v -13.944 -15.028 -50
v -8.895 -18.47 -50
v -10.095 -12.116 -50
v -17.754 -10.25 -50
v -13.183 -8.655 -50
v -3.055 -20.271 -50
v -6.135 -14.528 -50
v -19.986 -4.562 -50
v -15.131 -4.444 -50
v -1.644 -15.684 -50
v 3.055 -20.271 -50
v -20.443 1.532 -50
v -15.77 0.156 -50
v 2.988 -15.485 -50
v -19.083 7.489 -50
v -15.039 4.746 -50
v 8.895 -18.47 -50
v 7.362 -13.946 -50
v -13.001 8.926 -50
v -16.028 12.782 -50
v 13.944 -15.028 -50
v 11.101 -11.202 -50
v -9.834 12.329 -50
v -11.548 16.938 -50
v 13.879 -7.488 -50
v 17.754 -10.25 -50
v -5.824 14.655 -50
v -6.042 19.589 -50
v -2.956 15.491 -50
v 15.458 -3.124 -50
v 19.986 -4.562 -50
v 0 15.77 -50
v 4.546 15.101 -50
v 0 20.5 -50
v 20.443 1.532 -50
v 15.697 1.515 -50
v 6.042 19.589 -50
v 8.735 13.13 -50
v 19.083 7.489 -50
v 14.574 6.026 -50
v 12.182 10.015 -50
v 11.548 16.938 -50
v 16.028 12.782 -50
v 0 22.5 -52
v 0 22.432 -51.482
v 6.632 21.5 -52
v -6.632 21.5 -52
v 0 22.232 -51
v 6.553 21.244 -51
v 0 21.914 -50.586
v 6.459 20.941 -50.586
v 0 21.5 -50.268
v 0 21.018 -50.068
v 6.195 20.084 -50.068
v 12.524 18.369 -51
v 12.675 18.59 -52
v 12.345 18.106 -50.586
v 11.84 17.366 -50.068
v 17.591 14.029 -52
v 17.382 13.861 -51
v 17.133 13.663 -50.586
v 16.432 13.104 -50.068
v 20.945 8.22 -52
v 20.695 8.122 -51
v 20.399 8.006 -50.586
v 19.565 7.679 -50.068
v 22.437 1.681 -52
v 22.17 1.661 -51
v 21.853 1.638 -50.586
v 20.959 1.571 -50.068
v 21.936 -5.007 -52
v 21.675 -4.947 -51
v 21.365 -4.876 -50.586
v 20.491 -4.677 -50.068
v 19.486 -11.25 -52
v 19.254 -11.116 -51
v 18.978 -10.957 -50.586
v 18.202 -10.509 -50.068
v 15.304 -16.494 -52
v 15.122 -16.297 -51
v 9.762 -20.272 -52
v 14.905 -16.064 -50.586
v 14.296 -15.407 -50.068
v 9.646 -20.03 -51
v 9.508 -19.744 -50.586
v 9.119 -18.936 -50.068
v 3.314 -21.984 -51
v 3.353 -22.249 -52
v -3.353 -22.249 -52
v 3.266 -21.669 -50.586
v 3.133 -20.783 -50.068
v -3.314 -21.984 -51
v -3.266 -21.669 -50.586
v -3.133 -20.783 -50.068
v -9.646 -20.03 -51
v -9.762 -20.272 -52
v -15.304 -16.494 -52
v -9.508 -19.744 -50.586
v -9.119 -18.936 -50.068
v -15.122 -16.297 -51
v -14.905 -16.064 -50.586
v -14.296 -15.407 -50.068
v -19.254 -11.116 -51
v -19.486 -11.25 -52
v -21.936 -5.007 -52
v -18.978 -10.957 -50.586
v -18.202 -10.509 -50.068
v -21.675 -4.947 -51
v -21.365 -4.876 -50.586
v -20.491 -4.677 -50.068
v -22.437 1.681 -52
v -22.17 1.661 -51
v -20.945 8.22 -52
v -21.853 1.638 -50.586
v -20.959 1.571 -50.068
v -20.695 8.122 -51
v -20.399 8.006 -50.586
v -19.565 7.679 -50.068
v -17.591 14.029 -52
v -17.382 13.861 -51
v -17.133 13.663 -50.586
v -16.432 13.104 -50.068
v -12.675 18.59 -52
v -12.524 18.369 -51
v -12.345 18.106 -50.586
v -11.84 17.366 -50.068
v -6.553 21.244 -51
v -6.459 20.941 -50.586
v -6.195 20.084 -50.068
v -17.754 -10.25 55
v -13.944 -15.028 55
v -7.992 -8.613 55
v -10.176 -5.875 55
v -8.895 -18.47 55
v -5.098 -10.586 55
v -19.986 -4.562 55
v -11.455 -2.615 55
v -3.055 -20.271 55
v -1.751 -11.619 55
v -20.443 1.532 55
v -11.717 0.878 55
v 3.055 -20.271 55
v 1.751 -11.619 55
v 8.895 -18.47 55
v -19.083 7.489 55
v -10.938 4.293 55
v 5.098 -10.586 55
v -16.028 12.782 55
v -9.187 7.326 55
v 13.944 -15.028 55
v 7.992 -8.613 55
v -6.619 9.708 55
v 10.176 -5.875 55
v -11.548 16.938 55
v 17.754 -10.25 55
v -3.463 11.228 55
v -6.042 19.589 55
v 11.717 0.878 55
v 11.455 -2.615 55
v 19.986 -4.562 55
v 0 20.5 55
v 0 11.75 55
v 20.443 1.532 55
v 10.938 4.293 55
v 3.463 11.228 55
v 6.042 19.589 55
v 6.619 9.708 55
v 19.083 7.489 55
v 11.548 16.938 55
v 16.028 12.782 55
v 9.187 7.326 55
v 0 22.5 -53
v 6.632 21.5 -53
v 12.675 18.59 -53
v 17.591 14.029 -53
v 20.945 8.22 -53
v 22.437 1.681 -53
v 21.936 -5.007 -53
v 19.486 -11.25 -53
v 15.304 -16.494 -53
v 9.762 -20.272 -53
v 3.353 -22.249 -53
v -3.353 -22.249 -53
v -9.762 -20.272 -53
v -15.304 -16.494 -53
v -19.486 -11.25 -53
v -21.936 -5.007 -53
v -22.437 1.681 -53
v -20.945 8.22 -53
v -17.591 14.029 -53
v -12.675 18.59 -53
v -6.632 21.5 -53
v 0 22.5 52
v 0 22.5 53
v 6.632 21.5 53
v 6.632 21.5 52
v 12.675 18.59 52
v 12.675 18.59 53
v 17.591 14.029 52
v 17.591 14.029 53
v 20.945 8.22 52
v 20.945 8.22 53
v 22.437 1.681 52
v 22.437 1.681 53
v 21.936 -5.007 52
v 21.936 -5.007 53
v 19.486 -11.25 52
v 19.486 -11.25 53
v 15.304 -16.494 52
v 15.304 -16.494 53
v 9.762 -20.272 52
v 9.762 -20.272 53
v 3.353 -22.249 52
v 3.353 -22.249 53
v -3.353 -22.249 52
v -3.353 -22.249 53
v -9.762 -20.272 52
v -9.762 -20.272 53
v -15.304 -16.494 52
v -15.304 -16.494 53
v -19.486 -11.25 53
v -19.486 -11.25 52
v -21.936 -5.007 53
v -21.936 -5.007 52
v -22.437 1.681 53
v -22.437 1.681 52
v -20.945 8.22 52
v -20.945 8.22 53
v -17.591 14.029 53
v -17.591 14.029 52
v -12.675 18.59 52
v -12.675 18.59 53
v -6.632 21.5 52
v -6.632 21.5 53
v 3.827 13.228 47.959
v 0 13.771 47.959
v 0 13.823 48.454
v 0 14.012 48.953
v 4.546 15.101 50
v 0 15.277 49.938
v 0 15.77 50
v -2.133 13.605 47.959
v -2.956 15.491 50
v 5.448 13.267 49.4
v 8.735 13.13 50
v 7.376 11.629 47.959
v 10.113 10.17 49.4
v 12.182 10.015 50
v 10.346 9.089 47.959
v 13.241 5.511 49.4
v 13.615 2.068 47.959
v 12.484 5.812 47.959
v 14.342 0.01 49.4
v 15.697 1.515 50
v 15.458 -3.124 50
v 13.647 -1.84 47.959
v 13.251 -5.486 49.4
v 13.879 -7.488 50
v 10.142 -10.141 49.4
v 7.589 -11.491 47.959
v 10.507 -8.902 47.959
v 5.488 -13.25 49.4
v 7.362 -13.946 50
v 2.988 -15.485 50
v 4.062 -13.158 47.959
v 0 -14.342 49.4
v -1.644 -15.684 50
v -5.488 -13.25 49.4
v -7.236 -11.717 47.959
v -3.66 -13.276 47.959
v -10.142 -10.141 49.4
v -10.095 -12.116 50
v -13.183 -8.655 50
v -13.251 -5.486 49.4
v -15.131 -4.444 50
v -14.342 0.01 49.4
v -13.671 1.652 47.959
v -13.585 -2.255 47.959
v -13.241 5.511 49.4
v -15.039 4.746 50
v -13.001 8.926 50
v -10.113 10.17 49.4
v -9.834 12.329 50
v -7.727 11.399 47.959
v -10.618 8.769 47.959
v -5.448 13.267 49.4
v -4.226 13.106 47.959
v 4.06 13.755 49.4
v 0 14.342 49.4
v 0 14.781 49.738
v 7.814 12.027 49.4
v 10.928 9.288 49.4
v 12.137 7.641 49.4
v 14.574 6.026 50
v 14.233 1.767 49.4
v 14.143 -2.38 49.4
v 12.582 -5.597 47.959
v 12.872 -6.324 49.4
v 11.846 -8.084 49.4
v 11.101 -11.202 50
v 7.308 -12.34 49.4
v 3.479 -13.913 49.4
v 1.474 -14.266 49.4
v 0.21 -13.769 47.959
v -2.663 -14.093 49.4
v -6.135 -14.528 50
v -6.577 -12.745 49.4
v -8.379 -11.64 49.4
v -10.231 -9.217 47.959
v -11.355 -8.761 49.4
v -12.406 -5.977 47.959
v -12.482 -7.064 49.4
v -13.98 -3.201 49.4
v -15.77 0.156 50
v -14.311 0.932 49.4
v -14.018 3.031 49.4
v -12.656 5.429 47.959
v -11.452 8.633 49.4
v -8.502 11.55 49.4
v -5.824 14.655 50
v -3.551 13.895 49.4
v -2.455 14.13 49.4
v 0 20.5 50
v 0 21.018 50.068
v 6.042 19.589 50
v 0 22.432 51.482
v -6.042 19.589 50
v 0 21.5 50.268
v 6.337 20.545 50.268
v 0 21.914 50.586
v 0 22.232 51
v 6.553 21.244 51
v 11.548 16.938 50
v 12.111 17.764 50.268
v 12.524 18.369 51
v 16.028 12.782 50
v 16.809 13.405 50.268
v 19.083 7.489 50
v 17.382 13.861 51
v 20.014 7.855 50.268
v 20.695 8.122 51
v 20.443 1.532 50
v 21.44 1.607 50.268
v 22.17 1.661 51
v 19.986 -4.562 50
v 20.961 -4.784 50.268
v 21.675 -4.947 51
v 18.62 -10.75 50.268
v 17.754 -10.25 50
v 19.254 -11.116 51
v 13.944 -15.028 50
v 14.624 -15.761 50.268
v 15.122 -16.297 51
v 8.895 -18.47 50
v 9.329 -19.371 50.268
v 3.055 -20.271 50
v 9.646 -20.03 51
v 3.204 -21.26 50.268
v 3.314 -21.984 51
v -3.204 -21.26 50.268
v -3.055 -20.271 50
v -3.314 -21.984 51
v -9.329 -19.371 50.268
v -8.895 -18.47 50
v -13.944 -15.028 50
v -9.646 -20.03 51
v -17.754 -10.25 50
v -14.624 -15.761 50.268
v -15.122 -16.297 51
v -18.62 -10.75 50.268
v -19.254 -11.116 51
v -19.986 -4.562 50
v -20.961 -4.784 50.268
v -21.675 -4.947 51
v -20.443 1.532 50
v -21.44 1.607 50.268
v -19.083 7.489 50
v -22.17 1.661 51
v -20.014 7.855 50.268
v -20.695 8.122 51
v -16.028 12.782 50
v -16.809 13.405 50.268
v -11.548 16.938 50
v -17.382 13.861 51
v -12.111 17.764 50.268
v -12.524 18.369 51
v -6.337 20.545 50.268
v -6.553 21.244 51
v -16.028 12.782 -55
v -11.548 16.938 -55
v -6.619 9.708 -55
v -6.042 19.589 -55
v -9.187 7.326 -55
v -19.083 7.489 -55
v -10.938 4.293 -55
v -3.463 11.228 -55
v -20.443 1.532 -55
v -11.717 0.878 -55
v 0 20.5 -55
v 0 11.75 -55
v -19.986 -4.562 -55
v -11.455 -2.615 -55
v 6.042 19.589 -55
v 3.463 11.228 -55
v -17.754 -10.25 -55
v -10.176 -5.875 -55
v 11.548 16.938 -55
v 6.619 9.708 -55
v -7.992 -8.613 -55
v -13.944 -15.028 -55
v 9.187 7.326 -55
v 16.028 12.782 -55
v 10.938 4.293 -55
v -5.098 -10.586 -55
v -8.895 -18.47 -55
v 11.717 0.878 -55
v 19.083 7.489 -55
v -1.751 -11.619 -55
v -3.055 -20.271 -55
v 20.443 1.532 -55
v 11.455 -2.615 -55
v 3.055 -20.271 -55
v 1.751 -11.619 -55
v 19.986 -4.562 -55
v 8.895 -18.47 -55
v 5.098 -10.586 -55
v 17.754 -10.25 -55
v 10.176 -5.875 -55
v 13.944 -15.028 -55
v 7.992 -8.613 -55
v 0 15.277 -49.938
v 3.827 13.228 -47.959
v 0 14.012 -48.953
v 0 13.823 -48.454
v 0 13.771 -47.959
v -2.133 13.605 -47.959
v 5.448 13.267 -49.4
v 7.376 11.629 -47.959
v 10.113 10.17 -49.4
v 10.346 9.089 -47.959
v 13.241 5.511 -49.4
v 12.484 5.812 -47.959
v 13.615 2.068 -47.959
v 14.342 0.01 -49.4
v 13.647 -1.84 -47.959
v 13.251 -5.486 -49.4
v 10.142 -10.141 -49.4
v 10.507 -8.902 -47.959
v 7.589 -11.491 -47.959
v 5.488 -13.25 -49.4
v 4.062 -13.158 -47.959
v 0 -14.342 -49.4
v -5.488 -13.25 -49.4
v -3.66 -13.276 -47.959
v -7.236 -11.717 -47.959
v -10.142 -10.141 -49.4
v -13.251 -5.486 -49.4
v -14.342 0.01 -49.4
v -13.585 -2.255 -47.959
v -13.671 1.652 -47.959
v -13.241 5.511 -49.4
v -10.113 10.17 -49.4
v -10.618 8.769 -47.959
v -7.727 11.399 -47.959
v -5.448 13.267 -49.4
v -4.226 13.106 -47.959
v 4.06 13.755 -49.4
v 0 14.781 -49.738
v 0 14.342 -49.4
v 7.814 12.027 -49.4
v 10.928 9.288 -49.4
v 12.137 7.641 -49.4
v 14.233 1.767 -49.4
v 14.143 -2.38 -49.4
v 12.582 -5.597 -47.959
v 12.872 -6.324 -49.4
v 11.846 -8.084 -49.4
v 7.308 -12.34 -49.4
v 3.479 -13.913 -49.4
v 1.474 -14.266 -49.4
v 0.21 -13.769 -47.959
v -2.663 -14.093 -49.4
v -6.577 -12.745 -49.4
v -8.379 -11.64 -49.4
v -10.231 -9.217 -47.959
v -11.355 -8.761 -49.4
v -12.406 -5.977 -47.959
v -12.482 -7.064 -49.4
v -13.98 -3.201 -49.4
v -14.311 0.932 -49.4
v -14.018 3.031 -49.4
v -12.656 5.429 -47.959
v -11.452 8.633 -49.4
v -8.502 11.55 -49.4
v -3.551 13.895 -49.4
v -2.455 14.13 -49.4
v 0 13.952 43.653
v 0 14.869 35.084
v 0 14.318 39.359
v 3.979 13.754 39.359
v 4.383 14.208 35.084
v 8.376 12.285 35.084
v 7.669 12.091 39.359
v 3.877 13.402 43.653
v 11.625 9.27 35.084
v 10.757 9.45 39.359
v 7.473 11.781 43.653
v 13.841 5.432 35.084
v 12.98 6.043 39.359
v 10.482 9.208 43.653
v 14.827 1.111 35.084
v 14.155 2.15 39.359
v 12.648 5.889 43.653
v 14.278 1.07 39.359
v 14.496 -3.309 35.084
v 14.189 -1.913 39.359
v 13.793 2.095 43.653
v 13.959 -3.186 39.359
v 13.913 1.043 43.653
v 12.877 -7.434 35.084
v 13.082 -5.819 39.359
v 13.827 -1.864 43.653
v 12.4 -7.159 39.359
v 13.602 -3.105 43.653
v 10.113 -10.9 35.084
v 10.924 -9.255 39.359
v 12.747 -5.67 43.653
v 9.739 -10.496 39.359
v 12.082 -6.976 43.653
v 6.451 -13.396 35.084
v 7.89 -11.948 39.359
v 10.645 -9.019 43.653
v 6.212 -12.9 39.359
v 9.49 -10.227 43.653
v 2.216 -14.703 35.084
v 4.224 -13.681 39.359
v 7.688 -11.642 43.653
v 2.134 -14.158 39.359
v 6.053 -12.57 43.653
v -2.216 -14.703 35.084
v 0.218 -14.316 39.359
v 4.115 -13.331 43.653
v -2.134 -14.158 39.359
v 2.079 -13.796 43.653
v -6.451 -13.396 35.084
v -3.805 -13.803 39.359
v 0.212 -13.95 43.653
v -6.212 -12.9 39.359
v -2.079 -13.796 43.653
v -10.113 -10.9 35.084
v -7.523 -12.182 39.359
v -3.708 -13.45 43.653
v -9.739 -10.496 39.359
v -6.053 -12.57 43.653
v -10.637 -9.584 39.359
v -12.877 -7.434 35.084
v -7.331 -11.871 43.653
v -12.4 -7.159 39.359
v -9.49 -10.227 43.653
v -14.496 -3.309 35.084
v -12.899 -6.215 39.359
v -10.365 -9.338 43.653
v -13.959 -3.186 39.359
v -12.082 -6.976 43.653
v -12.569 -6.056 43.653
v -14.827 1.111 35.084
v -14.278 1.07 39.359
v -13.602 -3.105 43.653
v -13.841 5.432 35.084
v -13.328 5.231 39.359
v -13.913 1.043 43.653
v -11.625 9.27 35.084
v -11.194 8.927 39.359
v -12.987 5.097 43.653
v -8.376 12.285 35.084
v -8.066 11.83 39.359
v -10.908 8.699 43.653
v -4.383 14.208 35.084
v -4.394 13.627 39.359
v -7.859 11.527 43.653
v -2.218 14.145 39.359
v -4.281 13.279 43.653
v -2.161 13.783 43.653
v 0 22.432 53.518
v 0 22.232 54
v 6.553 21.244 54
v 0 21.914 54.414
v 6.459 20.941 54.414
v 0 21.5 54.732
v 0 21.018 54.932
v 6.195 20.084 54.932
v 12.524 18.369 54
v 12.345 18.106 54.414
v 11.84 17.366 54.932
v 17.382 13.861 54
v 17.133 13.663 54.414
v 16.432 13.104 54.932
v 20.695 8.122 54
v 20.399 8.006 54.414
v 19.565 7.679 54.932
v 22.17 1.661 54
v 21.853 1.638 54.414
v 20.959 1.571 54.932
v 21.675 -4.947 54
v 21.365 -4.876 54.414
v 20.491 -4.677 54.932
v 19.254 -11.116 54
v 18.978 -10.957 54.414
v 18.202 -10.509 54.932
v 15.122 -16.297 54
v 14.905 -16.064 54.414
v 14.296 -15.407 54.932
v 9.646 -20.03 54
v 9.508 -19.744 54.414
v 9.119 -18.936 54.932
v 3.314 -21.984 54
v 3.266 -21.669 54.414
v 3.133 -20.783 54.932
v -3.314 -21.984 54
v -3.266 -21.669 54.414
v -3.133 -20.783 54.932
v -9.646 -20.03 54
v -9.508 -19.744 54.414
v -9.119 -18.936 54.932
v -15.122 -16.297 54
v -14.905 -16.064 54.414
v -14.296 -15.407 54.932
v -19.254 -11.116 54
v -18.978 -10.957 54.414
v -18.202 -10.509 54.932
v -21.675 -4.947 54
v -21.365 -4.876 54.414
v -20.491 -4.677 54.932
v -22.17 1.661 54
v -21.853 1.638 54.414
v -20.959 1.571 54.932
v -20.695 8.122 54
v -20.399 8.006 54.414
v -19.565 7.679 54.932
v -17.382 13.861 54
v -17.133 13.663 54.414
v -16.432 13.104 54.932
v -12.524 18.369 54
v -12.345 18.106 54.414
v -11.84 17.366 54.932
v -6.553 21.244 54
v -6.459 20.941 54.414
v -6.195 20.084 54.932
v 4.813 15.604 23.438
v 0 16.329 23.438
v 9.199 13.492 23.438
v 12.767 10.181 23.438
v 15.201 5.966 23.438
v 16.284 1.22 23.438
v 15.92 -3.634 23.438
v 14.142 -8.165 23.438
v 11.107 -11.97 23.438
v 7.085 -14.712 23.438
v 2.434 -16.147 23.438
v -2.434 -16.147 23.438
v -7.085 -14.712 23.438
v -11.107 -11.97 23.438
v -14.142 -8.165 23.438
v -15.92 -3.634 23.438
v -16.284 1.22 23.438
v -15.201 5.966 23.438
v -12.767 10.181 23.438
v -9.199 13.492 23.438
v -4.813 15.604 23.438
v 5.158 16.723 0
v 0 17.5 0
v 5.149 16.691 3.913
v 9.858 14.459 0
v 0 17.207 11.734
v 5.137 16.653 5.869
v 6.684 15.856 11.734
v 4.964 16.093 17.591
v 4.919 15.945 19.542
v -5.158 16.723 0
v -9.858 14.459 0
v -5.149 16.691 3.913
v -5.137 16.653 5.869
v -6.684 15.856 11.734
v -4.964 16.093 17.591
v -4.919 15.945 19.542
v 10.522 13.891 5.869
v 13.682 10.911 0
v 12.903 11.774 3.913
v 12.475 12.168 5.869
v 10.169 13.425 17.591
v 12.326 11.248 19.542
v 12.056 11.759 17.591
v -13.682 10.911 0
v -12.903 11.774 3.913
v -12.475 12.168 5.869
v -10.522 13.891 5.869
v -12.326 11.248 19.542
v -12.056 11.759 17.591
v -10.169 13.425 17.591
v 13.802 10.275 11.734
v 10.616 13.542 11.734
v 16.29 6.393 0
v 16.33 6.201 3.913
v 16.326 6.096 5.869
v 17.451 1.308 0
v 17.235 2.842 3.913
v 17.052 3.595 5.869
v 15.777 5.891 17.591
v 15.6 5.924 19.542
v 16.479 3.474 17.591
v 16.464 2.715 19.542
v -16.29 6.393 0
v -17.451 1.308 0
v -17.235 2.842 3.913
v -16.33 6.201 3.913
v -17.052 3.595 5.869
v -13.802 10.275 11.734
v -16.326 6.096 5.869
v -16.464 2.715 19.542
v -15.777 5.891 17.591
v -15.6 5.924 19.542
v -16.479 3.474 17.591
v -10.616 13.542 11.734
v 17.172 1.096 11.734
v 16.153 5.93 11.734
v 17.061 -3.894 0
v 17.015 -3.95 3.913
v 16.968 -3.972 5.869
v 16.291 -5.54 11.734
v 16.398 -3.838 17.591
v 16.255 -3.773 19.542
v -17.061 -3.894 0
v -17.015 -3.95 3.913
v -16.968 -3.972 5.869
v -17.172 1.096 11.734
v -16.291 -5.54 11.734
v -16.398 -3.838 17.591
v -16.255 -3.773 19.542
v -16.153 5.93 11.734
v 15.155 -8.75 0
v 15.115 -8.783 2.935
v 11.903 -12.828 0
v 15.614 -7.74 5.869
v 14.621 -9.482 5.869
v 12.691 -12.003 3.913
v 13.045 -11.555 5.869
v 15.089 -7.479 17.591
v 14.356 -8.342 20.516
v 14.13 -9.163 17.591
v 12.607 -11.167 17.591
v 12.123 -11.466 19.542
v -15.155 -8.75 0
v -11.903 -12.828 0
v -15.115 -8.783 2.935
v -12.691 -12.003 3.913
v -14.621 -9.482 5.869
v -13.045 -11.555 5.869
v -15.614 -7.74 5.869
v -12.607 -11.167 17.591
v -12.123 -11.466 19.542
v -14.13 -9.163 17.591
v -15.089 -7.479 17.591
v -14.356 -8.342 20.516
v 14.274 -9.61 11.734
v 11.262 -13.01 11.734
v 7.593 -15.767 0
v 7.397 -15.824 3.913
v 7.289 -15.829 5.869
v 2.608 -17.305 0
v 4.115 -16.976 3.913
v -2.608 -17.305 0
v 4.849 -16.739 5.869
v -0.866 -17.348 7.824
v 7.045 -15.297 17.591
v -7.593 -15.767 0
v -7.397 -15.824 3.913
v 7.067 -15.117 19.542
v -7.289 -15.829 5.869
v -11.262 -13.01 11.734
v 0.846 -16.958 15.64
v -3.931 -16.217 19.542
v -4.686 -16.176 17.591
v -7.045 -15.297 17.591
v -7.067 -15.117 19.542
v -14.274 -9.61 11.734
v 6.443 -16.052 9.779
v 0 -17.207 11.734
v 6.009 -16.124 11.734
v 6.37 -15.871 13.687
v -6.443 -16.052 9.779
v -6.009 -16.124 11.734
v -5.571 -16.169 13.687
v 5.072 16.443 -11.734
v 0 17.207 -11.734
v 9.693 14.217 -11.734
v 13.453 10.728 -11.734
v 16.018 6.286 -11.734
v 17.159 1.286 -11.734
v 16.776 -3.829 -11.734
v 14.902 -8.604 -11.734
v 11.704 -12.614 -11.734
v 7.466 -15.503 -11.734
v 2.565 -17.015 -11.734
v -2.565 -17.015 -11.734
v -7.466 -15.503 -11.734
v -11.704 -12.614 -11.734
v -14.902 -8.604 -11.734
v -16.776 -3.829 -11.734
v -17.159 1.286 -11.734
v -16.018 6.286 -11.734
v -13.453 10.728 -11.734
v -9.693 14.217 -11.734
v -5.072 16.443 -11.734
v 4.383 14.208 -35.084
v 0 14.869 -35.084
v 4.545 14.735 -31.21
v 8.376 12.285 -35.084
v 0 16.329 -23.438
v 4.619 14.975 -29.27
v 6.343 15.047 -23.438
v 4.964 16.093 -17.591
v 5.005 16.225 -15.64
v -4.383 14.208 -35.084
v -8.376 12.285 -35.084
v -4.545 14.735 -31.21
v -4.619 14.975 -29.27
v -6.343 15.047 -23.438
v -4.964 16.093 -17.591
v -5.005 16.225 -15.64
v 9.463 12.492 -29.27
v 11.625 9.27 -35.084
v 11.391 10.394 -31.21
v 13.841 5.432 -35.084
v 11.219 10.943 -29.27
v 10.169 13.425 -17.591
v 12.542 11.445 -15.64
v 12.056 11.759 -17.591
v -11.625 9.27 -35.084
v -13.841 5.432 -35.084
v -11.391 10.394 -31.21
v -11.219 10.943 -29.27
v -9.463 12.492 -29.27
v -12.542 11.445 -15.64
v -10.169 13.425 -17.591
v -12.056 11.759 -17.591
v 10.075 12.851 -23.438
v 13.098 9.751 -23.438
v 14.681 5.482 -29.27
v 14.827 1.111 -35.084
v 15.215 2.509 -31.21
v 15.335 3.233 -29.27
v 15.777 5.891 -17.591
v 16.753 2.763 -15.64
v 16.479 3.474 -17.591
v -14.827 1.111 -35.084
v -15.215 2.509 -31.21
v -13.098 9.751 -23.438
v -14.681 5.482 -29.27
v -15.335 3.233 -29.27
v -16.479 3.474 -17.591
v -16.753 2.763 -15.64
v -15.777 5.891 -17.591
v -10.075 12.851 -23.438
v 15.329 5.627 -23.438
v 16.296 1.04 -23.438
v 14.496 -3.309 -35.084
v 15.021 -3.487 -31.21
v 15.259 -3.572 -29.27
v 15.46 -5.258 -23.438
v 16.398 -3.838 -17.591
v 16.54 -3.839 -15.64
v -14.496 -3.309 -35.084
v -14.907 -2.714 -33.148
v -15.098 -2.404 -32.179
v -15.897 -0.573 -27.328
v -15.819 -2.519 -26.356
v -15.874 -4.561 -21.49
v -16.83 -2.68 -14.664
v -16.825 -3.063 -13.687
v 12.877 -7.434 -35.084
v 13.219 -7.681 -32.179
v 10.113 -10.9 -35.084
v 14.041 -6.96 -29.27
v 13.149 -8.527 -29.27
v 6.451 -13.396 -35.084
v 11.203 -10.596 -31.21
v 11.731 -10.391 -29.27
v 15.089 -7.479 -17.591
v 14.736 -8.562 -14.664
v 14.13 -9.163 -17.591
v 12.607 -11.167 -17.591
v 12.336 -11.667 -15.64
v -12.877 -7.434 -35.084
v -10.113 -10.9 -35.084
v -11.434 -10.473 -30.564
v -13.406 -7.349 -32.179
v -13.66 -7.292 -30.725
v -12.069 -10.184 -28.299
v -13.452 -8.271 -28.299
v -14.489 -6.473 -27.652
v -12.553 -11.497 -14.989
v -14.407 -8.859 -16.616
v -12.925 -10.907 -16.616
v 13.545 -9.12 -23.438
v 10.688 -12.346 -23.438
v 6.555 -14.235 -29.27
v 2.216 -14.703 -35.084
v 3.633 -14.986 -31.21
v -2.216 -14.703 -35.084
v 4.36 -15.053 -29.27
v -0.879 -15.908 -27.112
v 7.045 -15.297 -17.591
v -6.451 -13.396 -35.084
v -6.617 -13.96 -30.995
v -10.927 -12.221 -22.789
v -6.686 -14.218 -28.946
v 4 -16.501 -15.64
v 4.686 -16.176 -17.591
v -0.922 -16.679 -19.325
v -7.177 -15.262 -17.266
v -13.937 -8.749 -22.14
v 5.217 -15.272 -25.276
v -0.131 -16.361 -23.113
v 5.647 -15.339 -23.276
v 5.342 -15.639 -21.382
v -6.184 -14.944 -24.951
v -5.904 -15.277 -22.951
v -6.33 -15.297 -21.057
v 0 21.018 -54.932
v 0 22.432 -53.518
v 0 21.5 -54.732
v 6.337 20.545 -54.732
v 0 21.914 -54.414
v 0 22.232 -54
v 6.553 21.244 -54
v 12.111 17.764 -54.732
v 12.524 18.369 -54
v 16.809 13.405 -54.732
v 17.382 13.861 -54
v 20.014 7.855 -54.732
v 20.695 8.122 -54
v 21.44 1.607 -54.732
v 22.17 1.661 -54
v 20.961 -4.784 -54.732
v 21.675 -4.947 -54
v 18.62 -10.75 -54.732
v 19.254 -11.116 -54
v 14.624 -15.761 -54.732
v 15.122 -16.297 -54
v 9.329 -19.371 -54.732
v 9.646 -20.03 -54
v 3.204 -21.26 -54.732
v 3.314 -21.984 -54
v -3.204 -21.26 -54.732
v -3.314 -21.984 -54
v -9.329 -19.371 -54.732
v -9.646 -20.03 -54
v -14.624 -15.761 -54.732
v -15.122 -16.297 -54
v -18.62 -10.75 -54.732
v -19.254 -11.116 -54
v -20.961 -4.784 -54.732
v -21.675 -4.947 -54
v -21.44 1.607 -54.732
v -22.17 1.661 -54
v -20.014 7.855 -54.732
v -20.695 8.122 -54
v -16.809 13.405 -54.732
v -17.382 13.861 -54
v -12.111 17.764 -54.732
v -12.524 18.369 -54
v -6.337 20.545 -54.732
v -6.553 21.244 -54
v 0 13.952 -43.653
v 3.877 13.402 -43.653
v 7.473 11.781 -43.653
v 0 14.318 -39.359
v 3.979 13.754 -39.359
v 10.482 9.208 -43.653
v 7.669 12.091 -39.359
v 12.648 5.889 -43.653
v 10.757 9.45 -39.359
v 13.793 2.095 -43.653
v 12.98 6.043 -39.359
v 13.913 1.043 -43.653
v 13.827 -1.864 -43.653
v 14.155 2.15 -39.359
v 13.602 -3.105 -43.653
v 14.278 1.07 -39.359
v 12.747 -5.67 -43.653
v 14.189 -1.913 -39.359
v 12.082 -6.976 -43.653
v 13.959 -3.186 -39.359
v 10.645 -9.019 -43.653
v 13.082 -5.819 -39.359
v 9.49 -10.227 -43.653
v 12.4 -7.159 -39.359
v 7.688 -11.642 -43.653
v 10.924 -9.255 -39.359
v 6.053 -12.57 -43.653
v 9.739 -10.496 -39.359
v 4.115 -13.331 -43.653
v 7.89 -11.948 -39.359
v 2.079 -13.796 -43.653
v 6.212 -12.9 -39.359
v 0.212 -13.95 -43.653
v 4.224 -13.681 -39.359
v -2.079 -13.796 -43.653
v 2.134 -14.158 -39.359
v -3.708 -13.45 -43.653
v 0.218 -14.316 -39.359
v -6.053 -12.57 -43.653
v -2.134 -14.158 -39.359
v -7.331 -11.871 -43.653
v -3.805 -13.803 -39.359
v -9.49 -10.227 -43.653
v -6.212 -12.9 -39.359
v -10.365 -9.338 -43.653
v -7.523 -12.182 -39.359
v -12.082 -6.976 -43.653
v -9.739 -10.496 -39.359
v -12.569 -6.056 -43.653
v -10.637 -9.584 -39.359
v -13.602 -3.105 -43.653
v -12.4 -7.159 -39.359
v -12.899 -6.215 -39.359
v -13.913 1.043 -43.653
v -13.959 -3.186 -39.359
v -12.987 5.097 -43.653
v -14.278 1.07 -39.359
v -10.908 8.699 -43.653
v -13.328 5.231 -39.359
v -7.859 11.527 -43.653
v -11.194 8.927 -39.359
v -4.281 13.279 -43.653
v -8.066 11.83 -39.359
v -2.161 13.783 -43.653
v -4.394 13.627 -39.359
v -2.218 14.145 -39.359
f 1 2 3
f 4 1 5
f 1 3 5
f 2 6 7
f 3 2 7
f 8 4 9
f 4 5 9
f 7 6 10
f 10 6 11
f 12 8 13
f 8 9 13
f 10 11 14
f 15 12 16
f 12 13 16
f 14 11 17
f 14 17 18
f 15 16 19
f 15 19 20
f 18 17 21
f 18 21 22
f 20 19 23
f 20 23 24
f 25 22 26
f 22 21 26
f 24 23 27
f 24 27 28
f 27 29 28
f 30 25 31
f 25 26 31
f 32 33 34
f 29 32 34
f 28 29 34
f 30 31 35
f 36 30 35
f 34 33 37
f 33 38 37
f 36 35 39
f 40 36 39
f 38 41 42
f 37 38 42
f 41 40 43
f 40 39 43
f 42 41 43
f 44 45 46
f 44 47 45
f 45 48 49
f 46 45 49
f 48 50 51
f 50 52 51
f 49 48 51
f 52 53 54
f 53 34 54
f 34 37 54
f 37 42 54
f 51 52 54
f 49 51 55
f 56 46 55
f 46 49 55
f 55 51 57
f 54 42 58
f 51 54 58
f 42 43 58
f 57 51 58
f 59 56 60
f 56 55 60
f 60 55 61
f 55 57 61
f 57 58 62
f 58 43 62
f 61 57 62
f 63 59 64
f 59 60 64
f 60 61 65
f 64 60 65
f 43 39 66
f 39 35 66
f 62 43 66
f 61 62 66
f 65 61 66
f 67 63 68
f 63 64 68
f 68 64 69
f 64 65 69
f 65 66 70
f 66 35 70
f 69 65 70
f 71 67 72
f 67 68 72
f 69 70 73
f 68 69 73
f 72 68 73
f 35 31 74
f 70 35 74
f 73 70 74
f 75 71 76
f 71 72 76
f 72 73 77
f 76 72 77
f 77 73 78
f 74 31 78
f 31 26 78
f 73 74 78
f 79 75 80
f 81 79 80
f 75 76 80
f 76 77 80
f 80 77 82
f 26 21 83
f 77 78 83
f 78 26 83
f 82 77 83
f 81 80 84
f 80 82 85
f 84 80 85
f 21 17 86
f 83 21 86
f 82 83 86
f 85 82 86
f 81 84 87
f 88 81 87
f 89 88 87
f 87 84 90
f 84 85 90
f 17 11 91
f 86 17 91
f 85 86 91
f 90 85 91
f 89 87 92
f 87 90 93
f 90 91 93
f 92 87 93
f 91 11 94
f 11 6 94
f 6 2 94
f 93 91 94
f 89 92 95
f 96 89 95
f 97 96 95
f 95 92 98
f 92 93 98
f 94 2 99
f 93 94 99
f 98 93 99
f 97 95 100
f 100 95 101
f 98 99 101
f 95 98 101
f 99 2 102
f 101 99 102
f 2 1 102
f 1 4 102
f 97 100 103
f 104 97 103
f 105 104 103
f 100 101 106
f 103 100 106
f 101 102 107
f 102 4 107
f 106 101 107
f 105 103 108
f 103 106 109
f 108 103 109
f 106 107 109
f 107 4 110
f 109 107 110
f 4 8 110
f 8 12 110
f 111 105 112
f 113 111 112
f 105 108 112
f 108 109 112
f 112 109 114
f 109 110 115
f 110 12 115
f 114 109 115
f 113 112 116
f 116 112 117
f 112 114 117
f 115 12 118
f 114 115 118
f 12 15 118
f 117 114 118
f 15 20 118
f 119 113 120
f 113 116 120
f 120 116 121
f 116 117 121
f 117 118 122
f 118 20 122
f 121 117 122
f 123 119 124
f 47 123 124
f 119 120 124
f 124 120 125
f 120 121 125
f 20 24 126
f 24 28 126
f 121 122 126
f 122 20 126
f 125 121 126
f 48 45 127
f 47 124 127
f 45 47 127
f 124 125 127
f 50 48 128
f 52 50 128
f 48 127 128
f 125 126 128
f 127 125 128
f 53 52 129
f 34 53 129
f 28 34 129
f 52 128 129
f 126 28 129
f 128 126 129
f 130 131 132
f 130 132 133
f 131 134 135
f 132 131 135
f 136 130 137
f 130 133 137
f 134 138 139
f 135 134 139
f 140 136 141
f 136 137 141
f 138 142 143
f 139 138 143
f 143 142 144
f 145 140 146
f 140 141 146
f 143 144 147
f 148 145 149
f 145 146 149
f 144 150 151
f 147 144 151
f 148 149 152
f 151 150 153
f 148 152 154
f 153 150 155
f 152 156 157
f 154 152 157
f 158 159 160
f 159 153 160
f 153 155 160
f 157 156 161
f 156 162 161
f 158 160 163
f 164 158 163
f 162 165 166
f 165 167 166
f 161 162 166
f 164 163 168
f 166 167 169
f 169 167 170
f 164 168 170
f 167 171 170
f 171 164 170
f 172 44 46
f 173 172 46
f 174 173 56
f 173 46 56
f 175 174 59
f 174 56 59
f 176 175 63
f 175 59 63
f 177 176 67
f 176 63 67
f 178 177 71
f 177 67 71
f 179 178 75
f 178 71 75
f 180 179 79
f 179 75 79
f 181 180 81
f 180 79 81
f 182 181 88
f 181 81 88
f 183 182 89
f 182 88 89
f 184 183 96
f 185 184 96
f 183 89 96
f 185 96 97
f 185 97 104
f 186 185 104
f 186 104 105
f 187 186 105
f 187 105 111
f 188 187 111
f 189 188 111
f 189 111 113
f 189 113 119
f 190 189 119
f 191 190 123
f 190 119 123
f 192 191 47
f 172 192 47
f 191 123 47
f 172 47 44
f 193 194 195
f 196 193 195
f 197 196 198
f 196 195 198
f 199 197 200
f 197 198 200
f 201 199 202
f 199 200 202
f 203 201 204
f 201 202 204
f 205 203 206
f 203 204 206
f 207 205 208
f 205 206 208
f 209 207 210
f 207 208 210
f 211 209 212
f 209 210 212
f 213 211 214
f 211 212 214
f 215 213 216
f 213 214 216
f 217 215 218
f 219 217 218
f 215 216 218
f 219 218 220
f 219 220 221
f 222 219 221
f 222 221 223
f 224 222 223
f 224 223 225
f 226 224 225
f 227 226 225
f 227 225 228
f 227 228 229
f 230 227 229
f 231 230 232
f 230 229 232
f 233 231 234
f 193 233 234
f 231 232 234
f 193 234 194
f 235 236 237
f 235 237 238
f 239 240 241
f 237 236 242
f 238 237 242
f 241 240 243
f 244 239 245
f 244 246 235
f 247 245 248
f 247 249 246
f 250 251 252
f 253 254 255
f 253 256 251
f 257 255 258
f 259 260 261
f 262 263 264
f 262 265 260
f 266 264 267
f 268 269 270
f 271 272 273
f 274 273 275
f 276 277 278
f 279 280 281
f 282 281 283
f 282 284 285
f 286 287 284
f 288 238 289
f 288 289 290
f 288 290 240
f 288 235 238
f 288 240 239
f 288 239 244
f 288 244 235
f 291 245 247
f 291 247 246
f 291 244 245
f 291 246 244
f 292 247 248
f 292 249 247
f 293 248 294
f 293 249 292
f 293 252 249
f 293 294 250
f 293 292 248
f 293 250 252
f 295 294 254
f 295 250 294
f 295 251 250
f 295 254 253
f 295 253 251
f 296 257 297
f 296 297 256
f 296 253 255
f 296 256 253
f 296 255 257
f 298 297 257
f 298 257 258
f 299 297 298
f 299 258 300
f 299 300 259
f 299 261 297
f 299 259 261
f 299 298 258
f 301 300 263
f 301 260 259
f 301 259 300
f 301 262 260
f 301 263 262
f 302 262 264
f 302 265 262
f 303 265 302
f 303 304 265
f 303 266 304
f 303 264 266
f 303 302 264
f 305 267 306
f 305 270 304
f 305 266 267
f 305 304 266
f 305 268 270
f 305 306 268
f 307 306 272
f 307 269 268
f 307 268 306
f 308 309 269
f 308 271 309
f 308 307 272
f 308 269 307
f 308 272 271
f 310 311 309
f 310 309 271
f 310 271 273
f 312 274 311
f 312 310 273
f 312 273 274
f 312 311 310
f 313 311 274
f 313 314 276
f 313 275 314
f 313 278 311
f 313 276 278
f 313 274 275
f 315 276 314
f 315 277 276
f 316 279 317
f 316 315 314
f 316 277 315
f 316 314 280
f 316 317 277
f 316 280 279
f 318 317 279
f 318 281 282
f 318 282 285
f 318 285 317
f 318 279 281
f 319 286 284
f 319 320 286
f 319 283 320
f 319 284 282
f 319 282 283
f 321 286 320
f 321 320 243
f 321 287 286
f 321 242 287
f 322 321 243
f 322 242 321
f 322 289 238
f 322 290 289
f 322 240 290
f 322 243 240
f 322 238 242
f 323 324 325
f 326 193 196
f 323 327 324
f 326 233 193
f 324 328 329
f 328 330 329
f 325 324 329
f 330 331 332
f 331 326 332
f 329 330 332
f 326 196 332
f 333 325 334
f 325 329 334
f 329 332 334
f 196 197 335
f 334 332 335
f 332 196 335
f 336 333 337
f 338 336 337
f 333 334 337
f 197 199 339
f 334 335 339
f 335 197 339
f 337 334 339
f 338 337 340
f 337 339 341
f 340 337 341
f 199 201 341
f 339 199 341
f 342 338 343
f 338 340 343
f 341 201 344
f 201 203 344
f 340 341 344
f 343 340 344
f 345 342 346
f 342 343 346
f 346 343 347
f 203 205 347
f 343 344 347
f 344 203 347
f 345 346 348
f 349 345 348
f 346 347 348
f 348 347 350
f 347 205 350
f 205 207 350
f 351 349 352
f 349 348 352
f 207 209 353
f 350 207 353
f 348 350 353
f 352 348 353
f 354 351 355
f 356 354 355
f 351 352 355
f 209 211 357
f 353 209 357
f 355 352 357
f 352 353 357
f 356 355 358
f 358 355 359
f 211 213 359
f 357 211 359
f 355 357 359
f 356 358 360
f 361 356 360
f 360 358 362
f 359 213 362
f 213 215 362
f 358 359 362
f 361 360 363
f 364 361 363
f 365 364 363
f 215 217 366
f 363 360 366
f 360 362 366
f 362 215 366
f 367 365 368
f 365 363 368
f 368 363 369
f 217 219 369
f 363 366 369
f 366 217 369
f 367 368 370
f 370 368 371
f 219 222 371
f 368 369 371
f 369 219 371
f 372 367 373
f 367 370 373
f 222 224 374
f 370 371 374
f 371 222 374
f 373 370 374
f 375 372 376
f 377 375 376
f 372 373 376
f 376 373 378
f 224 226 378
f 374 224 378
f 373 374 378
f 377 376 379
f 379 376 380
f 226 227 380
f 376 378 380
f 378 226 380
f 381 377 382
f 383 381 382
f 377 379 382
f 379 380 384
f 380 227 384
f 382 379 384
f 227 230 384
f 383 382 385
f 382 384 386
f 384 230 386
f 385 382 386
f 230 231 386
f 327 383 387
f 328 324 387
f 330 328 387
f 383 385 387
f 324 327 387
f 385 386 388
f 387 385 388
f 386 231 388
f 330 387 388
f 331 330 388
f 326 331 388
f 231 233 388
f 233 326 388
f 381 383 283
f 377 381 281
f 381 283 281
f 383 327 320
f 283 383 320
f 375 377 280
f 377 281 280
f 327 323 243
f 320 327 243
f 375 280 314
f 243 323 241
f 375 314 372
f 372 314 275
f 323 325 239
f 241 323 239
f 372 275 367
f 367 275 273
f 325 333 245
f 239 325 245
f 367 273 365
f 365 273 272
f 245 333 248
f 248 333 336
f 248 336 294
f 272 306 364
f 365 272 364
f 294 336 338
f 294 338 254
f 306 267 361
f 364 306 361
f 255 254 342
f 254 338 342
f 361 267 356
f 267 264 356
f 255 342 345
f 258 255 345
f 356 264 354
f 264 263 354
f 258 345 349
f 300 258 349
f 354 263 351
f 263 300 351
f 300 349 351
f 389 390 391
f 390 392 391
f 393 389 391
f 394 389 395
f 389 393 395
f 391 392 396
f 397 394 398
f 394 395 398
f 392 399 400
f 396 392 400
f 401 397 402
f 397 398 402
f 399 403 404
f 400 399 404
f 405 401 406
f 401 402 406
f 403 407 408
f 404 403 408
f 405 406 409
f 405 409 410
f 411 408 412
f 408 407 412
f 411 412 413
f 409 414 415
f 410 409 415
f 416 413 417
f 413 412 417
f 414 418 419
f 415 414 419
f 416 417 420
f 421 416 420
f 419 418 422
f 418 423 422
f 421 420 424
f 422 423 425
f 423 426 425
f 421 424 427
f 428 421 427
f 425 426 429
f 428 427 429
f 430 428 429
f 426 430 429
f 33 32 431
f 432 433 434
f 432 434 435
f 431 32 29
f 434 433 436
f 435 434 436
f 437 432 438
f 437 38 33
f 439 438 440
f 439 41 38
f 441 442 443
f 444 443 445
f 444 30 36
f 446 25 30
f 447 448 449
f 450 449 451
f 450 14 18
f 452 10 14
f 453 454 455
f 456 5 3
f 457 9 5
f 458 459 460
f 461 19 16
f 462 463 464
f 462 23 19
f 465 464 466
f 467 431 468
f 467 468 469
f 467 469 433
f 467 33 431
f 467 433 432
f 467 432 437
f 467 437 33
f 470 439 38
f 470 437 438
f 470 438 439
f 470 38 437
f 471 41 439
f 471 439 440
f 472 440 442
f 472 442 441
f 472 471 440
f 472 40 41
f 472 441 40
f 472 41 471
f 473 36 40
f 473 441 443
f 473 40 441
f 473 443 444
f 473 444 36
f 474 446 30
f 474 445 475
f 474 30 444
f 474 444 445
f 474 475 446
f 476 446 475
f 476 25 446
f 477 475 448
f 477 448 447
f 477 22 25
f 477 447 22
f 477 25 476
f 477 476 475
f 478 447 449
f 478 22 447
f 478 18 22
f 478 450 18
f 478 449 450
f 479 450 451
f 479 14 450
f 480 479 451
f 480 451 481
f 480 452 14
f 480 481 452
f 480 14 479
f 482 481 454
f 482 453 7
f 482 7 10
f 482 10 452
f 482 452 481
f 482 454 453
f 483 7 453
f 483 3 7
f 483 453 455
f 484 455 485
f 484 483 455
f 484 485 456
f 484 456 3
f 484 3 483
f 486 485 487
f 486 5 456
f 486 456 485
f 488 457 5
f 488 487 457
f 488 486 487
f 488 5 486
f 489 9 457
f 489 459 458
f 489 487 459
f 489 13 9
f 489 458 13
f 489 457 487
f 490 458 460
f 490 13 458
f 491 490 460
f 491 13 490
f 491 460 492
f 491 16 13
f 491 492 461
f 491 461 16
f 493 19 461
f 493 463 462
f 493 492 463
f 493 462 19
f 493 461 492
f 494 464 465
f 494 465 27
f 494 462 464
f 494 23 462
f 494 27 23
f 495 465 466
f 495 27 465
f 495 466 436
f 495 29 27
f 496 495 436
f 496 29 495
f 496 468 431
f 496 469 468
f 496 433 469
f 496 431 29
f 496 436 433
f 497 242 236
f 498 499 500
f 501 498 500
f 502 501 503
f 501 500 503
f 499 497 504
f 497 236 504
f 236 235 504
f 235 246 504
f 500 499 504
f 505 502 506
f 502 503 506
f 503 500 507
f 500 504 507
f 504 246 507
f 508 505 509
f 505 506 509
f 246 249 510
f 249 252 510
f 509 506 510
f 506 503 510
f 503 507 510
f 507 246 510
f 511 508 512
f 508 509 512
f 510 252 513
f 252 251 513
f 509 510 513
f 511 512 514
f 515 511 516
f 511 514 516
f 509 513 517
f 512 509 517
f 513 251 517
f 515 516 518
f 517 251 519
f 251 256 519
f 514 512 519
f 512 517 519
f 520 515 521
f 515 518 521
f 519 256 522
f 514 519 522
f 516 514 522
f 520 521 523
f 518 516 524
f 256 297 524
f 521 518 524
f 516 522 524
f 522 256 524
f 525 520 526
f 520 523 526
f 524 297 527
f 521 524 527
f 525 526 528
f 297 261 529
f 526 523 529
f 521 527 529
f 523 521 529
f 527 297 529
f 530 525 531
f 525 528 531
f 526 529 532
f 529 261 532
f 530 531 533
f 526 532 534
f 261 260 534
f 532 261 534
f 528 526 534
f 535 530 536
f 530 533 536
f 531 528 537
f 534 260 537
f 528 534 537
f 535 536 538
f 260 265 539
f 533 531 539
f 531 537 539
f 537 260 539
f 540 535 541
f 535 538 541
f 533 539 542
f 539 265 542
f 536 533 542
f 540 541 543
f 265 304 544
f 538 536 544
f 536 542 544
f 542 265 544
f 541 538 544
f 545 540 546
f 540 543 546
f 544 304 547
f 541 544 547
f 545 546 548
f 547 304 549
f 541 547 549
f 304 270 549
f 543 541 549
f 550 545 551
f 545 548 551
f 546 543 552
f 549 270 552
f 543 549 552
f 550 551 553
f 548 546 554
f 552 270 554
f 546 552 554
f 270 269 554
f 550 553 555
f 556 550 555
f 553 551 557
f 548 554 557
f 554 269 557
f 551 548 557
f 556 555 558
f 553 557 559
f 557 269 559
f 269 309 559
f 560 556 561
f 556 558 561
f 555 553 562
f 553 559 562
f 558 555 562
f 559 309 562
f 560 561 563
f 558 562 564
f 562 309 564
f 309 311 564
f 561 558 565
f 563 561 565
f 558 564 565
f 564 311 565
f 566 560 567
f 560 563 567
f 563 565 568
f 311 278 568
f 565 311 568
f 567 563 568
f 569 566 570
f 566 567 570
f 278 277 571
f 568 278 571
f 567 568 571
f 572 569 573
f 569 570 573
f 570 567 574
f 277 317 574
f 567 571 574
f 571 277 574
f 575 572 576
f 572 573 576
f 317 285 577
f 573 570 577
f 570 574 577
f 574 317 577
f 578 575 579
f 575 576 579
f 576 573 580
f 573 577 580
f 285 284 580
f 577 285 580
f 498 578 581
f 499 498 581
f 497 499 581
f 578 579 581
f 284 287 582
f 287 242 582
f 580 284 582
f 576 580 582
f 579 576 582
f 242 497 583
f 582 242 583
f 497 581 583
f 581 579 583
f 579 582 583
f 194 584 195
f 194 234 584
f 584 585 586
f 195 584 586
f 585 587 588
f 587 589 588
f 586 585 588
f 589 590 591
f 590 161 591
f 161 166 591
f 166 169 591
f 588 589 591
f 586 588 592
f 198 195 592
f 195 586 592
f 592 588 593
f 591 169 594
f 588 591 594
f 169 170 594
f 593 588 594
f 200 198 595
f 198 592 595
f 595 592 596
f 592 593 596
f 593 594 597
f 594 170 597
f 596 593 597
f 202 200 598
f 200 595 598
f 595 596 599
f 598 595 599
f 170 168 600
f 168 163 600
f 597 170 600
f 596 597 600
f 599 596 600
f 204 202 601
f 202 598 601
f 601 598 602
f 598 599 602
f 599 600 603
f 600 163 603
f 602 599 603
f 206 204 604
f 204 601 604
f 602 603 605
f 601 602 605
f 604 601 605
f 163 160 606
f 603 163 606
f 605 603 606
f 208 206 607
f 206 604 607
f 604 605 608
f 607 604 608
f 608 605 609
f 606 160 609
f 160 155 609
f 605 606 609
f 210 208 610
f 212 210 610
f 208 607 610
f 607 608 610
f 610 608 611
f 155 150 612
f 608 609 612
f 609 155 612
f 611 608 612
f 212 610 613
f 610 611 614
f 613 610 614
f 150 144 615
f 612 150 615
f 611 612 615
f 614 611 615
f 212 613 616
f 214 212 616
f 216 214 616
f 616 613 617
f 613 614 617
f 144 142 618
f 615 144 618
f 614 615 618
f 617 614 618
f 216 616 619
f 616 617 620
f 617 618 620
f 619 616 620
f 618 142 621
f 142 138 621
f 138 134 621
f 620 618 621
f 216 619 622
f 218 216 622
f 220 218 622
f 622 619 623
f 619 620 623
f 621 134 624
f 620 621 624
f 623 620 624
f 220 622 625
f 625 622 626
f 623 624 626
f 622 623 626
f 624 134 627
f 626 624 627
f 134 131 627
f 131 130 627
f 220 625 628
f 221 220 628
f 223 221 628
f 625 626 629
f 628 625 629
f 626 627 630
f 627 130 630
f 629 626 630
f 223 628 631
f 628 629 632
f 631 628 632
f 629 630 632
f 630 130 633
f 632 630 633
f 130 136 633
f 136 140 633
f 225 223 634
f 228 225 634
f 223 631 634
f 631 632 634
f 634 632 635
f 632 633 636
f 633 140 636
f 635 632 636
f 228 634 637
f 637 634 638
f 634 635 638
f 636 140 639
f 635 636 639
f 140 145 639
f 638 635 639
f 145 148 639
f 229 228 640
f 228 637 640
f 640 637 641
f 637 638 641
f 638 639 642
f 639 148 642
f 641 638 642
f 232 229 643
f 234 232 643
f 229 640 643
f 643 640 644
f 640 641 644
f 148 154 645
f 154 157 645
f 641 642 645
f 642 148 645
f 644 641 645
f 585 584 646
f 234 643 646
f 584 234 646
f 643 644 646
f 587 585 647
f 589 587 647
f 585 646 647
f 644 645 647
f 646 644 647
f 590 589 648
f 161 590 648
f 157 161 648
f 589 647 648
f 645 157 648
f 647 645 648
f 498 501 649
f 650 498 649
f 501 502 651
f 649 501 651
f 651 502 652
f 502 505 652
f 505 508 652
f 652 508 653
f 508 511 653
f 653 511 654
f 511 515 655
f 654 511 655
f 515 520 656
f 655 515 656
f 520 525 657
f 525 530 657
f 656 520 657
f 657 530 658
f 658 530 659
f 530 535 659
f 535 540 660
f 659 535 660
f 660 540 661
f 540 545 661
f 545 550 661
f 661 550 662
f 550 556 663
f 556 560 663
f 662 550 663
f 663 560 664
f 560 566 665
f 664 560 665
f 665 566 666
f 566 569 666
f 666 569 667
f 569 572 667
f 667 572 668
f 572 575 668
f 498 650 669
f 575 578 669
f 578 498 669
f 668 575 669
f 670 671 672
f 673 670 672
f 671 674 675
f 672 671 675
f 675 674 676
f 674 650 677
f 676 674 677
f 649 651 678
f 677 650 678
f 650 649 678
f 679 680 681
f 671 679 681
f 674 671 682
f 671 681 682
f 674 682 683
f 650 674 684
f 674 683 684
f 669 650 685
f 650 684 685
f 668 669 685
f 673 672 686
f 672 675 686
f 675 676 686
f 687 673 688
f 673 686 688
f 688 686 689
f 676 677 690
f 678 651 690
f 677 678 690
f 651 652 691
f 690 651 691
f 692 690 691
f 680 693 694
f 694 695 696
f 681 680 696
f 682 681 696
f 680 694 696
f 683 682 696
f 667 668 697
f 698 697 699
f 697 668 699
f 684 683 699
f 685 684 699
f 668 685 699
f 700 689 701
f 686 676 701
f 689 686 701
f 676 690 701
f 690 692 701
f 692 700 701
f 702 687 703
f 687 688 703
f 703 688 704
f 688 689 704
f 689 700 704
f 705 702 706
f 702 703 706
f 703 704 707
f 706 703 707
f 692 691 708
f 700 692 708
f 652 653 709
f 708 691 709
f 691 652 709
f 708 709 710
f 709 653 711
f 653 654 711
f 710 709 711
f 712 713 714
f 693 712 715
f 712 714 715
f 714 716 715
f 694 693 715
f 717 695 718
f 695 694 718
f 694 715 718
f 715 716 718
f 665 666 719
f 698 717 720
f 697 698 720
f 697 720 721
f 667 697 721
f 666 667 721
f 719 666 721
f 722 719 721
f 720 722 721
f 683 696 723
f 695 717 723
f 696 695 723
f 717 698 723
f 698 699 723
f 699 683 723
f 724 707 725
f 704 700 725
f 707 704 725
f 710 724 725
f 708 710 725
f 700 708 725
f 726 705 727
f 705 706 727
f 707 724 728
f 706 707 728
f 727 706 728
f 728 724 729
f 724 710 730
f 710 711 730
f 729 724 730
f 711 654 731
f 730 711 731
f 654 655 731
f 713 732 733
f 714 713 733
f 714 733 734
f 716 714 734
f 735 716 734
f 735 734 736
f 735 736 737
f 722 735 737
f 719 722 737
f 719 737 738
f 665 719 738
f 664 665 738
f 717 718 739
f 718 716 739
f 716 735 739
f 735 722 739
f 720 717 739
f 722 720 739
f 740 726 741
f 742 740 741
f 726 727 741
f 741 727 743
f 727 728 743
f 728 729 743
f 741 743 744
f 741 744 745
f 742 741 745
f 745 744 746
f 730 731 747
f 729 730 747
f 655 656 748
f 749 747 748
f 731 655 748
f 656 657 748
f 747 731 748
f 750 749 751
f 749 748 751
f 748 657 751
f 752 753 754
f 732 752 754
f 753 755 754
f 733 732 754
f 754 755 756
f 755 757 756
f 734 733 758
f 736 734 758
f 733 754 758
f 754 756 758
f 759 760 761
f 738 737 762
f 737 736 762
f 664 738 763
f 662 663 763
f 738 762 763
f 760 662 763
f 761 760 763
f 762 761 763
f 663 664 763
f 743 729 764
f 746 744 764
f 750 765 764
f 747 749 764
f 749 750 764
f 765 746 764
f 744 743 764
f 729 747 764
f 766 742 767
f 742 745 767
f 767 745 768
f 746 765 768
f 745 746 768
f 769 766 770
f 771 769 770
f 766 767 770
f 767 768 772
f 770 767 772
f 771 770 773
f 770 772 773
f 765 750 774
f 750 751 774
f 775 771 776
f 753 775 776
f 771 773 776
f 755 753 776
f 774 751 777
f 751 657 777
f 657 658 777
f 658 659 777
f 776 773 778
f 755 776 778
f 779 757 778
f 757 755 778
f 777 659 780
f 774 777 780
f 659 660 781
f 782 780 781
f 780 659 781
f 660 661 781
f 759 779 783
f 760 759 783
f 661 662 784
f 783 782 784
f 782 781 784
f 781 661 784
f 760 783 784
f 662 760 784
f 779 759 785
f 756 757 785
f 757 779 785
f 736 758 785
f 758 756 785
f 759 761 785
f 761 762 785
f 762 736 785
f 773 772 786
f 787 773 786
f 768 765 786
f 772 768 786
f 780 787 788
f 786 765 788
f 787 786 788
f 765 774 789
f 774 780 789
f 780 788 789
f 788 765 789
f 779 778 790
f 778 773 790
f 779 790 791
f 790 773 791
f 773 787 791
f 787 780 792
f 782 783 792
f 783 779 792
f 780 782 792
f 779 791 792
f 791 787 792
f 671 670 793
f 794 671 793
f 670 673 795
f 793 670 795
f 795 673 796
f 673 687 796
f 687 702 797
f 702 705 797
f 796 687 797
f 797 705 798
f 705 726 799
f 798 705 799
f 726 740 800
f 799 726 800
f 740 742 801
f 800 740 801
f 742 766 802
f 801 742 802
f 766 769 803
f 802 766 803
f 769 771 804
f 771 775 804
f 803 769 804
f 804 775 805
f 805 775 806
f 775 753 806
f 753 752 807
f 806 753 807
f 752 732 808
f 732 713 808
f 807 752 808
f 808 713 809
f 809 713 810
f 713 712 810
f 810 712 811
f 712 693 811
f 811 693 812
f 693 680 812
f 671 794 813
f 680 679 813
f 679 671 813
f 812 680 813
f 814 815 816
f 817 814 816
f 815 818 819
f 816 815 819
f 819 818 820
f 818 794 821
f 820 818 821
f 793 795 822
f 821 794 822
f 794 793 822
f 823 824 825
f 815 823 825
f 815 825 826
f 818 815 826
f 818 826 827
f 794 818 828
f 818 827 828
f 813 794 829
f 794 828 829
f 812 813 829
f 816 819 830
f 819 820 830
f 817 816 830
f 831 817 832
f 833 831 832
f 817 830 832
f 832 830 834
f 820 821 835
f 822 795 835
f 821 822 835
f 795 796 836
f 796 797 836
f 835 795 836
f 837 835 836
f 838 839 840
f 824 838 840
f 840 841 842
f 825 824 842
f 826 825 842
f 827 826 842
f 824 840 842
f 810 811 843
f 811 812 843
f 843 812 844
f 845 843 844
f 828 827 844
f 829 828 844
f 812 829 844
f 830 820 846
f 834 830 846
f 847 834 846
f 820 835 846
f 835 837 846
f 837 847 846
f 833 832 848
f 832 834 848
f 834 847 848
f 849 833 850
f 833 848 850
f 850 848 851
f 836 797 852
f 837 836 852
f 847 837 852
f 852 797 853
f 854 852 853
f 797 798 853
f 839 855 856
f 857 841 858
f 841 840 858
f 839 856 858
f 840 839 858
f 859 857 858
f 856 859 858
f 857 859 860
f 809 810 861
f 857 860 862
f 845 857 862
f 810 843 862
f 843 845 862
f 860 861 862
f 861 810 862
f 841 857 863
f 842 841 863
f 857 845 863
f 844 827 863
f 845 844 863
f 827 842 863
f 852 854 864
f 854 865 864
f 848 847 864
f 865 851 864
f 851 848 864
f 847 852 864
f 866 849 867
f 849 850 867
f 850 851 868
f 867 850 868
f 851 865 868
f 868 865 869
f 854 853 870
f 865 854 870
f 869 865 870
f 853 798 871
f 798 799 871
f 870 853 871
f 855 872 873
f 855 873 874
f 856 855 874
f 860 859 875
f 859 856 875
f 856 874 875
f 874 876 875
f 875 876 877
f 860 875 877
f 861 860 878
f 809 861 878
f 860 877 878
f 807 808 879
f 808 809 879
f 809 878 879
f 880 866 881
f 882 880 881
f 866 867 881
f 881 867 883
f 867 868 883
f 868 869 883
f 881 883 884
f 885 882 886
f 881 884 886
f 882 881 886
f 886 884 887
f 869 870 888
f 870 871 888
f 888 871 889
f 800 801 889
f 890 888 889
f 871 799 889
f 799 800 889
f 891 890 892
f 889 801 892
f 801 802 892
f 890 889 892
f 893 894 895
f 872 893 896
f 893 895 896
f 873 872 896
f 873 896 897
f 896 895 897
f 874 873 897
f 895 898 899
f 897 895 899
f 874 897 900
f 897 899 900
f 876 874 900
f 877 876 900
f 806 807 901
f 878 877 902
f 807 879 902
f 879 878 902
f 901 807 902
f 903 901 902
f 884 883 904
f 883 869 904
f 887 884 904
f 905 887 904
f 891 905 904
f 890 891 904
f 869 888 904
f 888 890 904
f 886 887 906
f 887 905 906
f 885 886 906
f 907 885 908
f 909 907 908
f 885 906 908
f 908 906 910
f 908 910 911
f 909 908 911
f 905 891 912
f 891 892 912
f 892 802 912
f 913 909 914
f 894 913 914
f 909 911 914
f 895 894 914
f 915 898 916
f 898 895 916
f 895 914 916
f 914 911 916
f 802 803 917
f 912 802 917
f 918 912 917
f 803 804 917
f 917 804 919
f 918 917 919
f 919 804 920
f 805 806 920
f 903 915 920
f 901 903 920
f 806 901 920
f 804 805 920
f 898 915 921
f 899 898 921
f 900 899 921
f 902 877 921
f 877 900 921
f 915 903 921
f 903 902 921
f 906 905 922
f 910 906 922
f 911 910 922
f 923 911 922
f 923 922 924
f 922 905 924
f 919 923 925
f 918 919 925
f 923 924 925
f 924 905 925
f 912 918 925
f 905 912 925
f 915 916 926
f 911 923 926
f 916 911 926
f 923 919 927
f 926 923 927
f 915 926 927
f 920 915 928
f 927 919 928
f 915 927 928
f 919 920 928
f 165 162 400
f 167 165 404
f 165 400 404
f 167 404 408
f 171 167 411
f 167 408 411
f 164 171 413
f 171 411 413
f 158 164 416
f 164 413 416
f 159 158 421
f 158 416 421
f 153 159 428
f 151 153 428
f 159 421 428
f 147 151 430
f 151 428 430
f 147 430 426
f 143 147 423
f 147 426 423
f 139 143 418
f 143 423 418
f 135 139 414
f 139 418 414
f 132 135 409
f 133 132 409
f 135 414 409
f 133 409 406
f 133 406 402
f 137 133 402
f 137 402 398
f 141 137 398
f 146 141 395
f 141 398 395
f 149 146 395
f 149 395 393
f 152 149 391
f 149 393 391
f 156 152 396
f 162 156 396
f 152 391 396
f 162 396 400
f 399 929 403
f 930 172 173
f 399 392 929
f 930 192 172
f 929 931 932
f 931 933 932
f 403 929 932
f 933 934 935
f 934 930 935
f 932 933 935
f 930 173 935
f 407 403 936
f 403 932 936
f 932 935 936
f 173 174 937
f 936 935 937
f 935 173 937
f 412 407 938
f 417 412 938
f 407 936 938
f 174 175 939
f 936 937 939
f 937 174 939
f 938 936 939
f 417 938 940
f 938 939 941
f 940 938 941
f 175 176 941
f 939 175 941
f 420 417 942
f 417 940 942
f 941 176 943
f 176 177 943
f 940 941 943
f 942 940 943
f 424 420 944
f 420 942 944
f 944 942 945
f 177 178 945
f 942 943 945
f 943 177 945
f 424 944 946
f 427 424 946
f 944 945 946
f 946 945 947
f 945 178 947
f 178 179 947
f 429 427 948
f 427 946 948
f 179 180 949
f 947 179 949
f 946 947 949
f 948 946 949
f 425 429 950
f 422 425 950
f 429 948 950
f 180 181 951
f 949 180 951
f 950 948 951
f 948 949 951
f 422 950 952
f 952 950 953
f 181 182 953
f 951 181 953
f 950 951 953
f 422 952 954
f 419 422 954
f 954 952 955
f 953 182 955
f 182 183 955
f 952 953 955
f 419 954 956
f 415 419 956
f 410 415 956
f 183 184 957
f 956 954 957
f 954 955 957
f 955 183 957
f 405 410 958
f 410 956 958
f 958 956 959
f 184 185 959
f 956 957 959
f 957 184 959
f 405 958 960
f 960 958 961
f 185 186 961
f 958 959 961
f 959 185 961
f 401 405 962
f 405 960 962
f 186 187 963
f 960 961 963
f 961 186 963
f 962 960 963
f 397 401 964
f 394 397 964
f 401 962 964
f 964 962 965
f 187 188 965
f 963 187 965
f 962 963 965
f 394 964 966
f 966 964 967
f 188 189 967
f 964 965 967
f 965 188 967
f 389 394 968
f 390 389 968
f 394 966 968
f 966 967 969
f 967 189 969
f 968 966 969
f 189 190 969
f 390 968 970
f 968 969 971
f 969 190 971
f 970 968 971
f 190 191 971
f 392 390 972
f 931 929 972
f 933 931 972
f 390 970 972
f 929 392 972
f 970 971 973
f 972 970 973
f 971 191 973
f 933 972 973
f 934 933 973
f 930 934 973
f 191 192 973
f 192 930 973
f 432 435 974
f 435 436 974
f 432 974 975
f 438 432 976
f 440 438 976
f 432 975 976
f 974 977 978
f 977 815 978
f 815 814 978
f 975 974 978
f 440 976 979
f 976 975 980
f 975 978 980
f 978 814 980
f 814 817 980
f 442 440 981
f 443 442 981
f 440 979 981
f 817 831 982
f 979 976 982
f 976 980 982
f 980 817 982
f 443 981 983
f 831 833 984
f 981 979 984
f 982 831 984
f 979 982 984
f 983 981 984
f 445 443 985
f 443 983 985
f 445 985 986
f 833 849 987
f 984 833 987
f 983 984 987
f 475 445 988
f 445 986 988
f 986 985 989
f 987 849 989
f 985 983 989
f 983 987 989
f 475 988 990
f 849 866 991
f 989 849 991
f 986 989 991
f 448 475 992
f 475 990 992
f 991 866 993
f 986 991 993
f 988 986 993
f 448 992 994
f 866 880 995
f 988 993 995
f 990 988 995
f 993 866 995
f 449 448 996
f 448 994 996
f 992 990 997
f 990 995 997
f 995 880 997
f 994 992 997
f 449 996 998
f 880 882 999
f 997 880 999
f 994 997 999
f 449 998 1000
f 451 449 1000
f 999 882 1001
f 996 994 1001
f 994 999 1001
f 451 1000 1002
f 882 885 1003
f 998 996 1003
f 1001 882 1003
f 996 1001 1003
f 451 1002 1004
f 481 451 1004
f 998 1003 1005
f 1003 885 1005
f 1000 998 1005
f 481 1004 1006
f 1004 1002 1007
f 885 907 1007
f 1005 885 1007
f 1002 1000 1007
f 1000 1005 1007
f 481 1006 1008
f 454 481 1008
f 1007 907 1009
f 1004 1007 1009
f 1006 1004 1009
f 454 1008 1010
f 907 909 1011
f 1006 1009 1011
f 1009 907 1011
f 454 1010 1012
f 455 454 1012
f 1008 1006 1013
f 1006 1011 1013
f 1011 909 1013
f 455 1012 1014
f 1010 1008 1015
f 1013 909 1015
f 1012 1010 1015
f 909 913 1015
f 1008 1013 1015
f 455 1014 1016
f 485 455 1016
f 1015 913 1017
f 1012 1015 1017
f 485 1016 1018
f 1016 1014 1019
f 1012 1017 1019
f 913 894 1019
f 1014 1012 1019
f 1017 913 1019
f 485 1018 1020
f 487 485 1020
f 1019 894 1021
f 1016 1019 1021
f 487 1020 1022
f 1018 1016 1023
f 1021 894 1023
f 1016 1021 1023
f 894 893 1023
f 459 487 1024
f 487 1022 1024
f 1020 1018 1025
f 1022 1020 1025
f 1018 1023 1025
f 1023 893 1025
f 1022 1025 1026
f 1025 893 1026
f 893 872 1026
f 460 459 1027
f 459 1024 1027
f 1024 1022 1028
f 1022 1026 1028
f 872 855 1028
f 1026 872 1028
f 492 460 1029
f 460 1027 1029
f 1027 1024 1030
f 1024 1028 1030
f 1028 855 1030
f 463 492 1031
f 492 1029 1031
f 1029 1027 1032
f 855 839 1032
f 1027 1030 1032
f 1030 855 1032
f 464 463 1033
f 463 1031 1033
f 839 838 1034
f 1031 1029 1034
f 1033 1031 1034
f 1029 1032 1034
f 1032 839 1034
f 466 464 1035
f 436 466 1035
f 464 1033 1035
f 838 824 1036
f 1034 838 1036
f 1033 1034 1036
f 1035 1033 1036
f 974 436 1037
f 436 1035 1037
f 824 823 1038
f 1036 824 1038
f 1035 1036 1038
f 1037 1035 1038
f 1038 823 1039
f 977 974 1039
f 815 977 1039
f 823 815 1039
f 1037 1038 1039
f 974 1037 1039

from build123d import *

# Parameters (mm, degrees)
F2_R = 2


with BuildPart() as f1:
    # F0 (on Right) → F1 (revolve)
    with BuildSketch(Plane.YZ):
        with BuildLine():
            Line((11.75, 15), (11.75, -55))
            Line((11.75, -55), (22.5, -55))
            Line((22.5, -55), (22.5, -50))
            Line((22.5, -50), (13.75, -50))
            ThreePointArc((13.75, -50), (14.030069, -42.521005), (14.868707, -35.083903))
            ThreePointArc((14.868707, -35.083903), (16.841254, -17.591219), (17.5, 0))
            ThreePointArc((17.5, 0), (16.841254, 17.591219), (14.868707, 35.083903))
            ThreePointArc((14.868707, 35.083903), (14.030069, 42.521005), (13.75, 50))
            Line((13.75, 50), (22.5, 50))
            Line((22.5, 50), (22.5, 55))
            Line((22.5, 55), (11.75, 55))
            Line((11.75, 55), (11.75, 15))
        make_face()
    revolve(axis=Axis((0, 0, 0), (0, 0, -1)))

    # F2
    f2_edges = [f1.edges().sort_by_distance(p)[0] for p in [
        (0, -22.5, 50),
        (0, -22.5, 55),
        (0, 22.5, 52.5),
        (0, -22.5, -55),
        (0, -22.5, -50),
        (0, 22.5, -52.5),
        (0, -13.75, 50),
        (0, -13.75, -50),
    ]]
    fillet(f2_edges, radius=F2_R)


solid = f1.part
